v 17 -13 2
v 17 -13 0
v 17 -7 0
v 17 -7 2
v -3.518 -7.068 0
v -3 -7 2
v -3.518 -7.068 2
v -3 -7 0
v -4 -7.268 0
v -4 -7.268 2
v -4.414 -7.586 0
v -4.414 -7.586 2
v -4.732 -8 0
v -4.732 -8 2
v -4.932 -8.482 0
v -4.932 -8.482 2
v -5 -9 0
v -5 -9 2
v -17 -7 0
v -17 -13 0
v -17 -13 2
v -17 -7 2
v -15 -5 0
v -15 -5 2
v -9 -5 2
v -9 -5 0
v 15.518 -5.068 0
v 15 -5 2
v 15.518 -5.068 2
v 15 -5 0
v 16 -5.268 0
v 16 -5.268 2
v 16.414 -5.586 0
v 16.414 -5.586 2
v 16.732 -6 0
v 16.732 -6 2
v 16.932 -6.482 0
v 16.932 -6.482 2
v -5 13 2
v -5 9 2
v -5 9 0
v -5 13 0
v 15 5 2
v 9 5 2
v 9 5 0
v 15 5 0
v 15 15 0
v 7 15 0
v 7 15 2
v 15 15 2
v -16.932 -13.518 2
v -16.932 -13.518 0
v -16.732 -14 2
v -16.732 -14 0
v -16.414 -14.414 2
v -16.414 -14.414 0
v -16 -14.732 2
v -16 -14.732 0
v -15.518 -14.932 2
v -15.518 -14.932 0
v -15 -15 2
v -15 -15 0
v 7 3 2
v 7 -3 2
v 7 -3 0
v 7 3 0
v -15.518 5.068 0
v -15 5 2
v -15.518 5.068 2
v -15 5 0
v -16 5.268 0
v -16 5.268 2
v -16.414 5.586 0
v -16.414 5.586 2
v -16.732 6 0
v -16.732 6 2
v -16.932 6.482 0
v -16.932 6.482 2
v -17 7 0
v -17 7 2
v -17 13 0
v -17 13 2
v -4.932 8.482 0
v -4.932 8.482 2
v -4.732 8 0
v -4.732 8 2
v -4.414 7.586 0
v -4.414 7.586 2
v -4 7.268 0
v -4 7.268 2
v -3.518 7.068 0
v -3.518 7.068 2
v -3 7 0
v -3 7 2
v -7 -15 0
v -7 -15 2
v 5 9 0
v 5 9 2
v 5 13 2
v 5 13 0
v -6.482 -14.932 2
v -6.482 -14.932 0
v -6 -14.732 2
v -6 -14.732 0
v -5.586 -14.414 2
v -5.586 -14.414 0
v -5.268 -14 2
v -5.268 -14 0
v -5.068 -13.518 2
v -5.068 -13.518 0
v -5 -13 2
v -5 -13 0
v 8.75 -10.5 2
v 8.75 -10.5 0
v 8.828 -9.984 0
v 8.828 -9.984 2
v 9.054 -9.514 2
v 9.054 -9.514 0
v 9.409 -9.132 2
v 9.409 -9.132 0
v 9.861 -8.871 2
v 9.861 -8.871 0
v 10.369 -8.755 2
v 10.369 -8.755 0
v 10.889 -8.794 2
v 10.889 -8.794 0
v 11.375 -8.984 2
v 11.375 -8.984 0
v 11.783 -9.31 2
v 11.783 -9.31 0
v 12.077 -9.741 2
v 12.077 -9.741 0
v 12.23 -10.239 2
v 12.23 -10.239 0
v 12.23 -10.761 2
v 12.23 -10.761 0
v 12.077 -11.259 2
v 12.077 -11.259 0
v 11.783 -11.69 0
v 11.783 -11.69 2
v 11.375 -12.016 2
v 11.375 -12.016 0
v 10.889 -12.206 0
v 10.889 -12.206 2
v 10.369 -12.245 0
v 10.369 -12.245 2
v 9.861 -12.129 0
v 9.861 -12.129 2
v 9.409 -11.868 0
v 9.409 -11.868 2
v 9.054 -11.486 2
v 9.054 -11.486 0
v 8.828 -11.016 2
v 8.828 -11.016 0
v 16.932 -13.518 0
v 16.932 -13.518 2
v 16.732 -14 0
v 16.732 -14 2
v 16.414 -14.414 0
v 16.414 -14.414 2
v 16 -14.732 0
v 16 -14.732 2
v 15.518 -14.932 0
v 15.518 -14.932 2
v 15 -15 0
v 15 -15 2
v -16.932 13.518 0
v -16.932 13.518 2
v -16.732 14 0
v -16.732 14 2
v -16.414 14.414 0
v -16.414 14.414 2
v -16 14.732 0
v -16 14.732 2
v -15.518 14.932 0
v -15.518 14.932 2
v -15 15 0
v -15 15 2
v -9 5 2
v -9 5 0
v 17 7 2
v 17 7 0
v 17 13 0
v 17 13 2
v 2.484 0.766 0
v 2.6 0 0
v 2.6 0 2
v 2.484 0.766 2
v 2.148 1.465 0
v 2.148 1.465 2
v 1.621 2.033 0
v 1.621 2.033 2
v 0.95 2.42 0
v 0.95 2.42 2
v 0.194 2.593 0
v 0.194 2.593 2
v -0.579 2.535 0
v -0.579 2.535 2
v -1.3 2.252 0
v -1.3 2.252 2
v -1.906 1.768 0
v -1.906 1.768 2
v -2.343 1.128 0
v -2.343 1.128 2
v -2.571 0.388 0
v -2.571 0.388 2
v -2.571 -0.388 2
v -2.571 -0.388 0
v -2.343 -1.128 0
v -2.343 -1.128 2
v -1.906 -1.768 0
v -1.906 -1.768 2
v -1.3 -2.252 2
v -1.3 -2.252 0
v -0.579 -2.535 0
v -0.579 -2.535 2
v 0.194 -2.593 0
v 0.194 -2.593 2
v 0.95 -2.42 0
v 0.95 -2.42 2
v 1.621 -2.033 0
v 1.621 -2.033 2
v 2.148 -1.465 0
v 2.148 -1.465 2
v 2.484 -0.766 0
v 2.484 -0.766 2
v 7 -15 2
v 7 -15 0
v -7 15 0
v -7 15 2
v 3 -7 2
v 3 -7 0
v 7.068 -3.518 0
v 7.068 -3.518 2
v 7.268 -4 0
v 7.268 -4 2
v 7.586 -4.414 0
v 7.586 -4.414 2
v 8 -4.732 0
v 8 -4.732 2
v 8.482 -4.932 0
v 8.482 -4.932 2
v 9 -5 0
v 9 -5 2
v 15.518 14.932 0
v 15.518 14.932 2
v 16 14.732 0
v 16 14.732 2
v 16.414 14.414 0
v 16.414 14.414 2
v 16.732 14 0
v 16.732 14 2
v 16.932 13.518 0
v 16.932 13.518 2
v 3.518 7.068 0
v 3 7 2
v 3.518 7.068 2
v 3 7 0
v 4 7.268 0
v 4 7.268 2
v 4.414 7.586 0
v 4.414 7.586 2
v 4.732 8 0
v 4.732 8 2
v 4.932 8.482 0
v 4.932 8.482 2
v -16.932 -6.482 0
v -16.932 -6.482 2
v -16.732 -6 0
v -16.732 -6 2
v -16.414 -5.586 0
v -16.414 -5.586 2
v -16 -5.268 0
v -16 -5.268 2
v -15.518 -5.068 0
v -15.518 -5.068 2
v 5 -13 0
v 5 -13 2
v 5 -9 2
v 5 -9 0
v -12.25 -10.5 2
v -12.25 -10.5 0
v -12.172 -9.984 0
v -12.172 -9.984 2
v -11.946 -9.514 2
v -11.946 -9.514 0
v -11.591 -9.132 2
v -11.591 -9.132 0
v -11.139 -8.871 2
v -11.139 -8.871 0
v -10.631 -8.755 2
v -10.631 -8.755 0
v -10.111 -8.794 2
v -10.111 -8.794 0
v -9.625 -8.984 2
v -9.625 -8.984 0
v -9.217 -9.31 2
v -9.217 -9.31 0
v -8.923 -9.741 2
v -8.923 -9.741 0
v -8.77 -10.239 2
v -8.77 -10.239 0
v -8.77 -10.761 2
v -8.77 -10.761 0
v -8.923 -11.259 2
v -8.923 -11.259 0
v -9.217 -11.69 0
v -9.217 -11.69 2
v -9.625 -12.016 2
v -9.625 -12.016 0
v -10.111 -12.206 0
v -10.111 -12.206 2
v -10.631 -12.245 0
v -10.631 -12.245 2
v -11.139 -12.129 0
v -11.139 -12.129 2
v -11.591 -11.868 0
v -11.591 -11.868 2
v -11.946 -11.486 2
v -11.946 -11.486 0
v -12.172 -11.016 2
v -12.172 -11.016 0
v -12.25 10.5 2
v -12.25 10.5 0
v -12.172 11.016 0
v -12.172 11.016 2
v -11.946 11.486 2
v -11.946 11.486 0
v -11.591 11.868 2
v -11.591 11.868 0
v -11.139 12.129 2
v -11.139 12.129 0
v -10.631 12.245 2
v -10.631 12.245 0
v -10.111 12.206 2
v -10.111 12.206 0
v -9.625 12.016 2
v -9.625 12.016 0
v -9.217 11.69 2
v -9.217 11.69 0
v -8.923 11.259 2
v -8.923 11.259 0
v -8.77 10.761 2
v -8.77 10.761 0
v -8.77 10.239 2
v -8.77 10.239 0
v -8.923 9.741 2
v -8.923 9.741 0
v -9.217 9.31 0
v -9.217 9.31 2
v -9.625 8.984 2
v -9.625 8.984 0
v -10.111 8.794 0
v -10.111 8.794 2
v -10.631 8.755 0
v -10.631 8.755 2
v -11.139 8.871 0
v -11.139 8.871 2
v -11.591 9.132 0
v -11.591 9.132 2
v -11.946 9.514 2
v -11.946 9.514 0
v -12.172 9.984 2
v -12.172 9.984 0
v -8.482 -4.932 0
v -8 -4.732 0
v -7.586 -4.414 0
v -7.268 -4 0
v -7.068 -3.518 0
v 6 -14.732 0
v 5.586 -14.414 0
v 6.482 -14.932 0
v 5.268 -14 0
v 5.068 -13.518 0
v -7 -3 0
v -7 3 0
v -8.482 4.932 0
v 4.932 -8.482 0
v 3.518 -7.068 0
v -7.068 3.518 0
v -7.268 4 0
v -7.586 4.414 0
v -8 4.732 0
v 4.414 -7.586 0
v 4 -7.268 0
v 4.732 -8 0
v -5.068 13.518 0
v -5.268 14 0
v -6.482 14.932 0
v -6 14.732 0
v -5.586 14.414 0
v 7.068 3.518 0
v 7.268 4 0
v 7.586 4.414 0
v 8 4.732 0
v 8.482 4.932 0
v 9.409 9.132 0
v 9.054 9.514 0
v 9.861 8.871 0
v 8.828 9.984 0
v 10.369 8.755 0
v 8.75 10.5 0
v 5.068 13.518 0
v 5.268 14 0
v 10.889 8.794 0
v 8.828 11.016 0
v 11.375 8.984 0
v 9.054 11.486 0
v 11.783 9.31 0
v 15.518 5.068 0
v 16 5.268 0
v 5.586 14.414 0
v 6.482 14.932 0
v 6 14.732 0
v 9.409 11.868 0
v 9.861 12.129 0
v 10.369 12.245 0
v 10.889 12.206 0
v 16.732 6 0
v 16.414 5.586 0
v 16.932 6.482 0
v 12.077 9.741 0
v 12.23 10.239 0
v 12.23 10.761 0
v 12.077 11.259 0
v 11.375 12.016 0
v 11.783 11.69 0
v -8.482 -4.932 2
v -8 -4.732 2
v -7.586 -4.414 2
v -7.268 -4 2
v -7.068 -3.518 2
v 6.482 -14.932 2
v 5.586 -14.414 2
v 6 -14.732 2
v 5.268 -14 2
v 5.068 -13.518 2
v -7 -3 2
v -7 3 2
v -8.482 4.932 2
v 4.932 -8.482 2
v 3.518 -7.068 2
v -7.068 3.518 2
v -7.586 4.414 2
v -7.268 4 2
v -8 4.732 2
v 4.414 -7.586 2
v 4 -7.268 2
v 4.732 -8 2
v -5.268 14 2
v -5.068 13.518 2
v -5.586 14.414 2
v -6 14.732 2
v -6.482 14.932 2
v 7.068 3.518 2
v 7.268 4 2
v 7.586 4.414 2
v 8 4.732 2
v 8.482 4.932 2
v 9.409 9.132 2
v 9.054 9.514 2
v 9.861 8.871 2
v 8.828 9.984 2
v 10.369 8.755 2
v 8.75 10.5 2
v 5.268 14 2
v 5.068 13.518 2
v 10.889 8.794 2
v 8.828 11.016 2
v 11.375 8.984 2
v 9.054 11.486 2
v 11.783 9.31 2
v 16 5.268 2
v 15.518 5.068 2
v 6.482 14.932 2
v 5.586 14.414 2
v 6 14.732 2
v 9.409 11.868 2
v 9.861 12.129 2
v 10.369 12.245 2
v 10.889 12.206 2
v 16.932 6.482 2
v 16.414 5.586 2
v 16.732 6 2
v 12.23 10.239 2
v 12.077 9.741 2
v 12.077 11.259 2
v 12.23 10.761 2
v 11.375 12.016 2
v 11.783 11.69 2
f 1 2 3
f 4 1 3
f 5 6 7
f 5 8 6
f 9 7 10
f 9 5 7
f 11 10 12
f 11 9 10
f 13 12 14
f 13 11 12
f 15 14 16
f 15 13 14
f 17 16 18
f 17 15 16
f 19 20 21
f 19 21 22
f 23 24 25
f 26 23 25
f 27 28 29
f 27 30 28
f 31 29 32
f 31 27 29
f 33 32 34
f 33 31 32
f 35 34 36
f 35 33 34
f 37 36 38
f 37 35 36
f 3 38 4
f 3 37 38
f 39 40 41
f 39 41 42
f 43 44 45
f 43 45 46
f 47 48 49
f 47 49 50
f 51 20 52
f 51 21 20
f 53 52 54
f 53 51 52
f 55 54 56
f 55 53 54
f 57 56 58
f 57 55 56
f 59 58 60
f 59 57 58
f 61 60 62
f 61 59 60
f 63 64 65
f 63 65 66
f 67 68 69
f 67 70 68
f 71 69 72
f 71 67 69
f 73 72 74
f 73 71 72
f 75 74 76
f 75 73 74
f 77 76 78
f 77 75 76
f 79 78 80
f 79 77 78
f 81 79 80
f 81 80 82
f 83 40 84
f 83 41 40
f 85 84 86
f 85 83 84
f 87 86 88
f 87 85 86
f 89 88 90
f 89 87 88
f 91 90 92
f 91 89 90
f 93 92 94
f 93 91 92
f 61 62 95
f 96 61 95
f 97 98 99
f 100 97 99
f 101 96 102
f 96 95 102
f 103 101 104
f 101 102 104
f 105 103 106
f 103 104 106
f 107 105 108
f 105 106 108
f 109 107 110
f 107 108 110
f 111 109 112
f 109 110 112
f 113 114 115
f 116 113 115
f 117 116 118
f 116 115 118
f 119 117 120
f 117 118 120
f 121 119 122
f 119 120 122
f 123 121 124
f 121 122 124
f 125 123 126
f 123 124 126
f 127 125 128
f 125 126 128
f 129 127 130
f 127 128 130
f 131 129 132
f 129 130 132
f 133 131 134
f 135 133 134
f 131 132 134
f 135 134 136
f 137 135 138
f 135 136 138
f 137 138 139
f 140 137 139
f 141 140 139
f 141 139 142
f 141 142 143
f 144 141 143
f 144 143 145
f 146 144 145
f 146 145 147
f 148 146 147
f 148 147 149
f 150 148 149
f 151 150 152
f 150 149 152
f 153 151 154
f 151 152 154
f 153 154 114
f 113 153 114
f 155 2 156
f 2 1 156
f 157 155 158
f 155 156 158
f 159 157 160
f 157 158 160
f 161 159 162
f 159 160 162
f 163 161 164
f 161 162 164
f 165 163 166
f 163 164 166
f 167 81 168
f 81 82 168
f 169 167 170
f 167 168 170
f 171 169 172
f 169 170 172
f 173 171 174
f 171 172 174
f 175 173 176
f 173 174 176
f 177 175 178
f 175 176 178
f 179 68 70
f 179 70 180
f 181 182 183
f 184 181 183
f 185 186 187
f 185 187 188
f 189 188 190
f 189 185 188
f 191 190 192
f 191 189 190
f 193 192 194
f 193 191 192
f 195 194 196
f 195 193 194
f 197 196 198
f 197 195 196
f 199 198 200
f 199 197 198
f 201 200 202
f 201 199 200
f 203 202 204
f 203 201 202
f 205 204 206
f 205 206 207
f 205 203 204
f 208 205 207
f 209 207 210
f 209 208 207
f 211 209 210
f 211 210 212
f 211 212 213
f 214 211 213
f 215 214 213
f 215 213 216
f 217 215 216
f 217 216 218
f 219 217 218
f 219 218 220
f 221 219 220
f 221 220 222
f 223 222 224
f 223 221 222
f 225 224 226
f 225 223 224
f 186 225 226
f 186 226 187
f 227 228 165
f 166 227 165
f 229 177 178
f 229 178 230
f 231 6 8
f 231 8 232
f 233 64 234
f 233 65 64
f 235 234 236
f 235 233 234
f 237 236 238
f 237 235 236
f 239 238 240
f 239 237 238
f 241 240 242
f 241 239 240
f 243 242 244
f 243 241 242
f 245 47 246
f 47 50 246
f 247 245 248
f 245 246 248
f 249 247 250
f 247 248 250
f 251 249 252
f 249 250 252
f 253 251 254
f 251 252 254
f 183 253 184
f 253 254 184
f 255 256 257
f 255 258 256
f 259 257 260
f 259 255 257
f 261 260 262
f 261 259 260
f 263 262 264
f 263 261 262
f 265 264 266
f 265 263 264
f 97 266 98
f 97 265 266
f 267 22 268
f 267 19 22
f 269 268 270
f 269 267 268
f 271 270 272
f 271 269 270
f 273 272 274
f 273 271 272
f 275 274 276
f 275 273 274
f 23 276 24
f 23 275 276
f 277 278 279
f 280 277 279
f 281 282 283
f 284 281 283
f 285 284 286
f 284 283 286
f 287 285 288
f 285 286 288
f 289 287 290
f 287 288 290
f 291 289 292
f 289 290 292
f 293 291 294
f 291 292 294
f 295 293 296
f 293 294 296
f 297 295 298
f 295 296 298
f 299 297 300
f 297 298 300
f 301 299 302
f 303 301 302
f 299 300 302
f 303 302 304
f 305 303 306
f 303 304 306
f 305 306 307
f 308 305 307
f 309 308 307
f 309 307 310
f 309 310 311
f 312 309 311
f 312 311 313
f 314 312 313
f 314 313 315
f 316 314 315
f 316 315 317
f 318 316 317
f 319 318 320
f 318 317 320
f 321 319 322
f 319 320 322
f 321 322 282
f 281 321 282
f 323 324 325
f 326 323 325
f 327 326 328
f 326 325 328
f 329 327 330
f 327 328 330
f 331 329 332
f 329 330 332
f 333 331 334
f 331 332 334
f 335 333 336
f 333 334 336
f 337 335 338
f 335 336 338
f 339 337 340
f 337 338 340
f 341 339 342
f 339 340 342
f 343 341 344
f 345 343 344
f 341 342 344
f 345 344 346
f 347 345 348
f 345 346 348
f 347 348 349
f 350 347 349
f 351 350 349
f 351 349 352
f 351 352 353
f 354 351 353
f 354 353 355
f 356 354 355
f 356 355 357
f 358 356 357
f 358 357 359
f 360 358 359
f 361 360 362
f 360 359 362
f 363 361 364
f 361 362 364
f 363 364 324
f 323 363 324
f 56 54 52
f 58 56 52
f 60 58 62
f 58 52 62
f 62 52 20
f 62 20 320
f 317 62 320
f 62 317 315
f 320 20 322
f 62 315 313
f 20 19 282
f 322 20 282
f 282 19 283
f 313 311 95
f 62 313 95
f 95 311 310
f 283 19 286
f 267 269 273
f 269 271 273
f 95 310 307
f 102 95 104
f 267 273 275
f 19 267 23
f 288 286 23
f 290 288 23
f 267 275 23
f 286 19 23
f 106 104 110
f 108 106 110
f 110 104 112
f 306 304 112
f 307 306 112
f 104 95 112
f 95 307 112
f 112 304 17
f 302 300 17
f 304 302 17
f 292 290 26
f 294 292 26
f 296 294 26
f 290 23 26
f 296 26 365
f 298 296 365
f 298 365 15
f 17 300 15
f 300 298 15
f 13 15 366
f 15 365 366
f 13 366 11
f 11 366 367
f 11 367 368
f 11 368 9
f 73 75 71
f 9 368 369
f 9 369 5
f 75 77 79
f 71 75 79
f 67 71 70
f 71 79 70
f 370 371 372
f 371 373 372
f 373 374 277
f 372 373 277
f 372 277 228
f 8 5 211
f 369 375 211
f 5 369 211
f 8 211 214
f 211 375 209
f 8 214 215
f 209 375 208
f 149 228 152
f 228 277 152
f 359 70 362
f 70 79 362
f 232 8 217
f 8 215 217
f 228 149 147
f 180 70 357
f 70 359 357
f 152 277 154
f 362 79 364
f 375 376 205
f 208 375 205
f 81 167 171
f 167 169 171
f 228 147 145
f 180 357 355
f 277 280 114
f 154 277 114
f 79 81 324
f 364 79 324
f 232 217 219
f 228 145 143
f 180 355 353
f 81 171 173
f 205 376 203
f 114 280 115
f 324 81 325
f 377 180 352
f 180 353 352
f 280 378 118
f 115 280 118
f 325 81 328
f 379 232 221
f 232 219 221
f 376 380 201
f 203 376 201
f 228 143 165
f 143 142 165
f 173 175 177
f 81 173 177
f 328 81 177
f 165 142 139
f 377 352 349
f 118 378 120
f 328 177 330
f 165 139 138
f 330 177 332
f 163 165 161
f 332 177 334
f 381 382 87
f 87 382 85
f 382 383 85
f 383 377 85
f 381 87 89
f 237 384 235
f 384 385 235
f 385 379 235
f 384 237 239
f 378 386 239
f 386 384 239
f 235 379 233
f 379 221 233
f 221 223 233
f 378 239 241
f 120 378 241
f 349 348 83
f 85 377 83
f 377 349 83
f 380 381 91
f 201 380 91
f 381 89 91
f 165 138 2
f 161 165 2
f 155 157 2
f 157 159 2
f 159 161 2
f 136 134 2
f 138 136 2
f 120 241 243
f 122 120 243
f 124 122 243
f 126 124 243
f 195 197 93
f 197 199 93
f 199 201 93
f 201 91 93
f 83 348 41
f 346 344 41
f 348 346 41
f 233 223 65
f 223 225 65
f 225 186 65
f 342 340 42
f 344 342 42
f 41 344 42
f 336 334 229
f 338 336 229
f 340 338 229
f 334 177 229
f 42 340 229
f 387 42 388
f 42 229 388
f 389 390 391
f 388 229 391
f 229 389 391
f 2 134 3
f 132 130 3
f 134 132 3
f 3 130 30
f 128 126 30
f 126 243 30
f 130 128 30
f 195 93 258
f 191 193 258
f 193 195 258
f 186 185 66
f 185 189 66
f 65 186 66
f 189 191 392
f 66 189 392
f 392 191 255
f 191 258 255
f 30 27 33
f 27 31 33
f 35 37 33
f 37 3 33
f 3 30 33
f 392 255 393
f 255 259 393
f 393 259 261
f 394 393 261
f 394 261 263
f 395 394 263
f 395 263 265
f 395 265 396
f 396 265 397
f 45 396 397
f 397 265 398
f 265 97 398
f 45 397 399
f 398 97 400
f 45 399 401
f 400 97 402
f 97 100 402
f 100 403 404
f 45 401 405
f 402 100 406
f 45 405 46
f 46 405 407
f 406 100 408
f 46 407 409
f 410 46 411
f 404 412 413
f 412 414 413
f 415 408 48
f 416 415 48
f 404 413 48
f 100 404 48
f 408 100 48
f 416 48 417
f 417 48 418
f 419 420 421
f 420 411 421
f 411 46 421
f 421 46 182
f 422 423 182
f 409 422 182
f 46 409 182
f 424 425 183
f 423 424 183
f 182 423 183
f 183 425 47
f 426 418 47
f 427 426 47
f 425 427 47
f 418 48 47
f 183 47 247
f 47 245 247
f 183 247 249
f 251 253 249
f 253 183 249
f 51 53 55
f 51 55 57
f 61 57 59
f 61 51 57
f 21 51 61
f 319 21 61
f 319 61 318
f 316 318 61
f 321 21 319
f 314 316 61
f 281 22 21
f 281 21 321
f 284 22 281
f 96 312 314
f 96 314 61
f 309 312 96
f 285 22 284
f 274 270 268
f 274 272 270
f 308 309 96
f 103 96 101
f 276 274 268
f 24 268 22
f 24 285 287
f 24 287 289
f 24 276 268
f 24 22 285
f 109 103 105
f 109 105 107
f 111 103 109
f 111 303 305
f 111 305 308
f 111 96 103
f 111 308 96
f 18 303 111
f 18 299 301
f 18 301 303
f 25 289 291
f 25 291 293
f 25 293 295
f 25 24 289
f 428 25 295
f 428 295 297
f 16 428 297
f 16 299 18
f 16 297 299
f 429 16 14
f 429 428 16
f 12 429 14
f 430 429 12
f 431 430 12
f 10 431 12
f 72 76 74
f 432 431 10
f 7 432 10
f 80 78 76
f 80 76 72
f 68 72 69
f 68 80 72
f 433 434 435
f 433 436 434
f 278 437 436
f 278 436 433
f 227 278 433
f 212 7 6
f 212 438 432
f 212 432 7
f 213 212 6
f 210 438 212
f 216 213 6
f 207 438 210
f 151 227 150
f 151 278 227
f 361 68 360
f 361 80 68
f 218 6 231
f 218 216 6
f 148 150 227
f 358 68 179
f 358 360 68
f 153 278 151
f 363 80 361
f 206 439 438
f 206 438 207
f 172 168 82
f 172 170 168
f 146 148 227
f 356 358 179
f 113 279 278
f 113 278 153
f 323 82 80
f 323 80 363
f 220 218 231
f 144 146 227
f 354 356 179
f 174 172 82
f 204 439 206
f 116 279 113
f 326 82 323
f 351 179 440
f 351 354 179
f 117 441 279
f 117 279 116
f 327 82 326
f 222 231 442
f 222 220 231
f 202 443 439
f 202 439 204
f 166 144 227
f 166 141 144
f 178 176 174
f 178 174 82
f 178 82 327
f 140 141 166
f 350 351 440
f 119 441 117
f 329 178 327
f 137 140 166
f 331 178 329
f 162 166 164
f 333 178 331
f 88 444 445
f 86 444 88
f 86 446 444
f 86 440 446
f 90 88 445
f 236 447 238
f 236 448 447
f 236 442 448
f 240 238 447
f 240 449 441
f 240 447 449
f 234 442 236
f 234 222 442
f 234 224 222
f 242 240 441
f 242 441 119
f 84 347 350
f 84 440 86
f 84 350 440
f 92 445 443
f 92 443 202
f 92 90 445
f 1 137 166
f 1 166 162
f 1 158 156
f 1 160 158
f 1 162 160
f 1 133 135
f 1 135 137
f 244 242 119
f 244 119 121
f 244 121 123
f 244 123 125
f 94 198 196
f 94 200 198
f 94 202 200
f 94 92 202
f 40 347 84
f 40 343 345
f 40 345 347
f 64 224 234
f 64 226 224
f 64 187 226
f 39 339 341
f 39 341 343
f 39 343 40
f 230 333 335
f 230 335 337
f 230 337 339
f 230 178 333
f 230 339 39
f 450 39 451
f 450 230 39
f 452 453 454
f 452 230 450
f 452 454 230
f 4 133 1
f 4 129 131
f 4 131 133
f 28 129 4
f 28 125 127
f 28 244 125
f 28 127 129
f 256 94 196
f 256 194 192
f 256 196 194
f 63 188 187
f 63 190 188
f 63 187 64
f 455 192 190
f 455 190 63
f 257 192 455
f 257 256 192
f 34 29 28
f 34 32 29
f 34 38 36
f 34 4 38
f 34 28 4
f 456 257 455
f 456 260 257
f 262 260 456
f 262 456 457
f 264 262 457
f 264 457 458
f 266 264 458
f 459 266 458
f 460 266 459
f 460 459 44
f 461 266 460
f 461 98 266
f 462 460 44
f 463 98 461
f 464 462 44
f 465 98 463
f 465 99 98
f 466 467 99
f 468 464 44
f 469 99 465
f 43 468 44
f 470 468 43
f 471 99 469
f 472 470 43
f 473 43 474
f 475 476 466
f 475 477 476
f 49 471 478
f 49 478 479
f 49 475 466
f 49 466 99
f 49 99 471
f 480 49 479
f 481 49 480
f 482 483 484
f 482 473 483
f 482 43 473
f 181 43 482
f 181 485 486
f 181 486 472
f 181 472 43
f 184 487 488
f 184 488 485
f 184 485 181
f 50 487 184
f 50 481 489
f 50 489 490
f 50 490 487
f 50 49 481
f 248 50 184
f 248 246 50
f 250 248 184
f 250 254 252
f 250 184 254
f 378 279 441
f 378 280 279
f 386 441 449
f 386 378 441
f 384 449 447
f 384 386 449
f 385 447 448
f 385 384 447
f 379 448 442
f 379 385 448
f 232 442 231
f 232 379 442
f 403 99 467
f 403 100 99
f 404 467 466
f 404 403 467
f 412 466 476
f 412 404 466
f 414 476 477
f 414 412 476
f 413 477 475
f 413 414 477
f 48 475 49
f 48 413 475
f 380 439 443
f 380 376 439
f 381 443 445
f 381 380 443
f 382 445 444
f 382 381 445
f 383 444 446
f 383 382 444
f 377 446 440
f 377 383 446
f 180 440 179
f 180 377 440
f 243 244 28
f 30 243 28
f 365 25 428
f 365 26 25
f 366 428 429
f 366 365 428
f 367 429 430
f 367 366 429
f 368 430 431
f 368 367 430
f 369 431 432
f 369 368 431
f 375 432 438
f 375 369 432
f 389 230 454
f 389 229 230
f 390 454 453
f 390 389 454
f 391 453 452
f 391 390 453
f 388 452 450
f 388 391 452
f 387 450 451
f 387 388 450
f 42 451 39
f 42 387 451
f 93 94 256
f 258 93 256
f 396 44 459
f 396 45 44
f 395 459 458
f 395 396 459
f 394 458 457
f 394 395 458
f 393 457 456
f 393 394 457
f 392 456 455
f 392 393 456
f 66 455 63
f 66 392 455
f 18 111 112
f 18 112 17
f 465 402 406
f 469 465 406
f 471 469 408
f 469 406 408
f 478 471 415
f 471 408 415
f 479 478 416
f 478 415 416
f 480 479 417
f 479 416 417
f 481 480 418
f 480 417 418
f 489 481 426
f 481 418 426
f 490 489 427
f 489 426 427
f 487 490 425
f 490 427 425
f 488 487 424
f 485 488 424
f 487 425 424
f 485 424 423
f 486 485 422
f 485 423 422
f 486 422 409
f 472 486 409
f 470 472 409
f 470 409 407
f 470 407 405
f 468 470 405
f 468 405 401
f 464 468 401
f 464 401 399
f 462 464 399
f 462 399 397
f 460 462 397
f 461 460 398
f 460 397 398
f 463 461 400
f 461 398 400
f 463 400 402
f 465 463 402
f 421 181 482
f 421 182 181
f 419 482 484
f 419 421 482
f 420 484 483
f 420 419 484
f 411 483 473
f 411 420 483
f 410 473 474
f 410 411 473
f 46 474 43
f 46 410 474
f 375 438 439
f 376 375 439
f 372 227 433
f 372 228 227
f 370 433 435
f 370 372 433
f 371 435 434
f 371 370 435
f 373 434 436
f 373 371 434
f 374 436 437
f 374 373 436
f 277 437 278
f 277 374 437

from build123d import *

# Parameters (mm, degrees)
SKETCH_1_W          = 34
SKETCH_1_H          = 30
SKETCH_1_R          = 2.6
EXTRUDE_1_DEPTH     = 2
SKETCH_2_R          = 1.75
CUT_EXTRUDE_1_DEPTH = 2
SKETCH_3_W          = 10
SKETCH_3_H          = 10
CUT_EXTRUDE_2_DEPTH = 2
FILLET_1_R          = 2


with BuildPart() as part:
    # 草图1 → 凸台-拉伸1 (new body)
    with BuildSketch(Plane.XY):
        Rectangle(SKETCH_1_W, SKETCH_1_H)
        Circle(SKETCH_1_R, mode=Mode.SUBTRACT)
    extrude(amount=EXTRUDE_1_DEPTH)

    # 草图2 → 切除-拉伸1 (cut)
    with BuildSketch(Plane(origin=(0, 0, 0), x_dir=(-1, 0, 0), z_dir=(0, 0, -1))):
        with Locations((10.5, -10.5)):
            Circle(SKETCH_2_R)
        with Locations((-10.5, -10.5)):
            Circle(SKETCH_2_R)
        with Locations((-10.5, 10.5)):
            Circle(SKETCH_2_R)
        with Locations((10.5, 10.5)):
            Circle(SKETCH_2_R)
    extrude(amount=-CUT_EXTRUDE_1_DEPTH, mode=Mode.SUBTRACT)

    # 草图3 → 切除-拉伸2 (cut)
    with BuildSketch(Plane.XY.offset(2)):
        with Locations((-12, 0)):
            Rectangle(SKETCH_3_W, SKETCH_3_H)
        with Locations((0, 12)):
            Rectangle(SKETCH_3_W, SKETCH_3_H)
        with Locations((12, 0)):
            Rectangle(SKETCH_3_W, SKETCH_3_H)
        with Locations((0, -12)):
            Rectangle(SKETCH_3_W, SKETCH_3_H)
    extrude(amount=-CUT_EXTRUDE_2_DEPTH, mode=Mode.SUBTRACT)

    # 圆角1
    fillet_1_edges = [part.edges().sort_by_distance(p)[0] for p in [
        (-17, -5, 1),
        (-17, 5, 1),
        (-7, 5, 1),
        (-7, -5, 1),
        (-5, 15, 1),
        (5, 15, 1),
        (-5, 7, 1),
        (5, 7, 1),
        (17, -5, 1),
        (7, -5, 1),
        (7, 5, 1),
        (17, 5, 1),
        (17, -15, 1),
        (-17, -15, 1),
        (-17, 15, 1),
        (17, 15, 1),
        (5, -15, 1),
        (-5, -15, 1),
        (5, -7, 1),
        (-5, -7, 1),
    ]]
    fillet(fillet_1_edges, radius=FILLET_1_R)


solid = part.part
